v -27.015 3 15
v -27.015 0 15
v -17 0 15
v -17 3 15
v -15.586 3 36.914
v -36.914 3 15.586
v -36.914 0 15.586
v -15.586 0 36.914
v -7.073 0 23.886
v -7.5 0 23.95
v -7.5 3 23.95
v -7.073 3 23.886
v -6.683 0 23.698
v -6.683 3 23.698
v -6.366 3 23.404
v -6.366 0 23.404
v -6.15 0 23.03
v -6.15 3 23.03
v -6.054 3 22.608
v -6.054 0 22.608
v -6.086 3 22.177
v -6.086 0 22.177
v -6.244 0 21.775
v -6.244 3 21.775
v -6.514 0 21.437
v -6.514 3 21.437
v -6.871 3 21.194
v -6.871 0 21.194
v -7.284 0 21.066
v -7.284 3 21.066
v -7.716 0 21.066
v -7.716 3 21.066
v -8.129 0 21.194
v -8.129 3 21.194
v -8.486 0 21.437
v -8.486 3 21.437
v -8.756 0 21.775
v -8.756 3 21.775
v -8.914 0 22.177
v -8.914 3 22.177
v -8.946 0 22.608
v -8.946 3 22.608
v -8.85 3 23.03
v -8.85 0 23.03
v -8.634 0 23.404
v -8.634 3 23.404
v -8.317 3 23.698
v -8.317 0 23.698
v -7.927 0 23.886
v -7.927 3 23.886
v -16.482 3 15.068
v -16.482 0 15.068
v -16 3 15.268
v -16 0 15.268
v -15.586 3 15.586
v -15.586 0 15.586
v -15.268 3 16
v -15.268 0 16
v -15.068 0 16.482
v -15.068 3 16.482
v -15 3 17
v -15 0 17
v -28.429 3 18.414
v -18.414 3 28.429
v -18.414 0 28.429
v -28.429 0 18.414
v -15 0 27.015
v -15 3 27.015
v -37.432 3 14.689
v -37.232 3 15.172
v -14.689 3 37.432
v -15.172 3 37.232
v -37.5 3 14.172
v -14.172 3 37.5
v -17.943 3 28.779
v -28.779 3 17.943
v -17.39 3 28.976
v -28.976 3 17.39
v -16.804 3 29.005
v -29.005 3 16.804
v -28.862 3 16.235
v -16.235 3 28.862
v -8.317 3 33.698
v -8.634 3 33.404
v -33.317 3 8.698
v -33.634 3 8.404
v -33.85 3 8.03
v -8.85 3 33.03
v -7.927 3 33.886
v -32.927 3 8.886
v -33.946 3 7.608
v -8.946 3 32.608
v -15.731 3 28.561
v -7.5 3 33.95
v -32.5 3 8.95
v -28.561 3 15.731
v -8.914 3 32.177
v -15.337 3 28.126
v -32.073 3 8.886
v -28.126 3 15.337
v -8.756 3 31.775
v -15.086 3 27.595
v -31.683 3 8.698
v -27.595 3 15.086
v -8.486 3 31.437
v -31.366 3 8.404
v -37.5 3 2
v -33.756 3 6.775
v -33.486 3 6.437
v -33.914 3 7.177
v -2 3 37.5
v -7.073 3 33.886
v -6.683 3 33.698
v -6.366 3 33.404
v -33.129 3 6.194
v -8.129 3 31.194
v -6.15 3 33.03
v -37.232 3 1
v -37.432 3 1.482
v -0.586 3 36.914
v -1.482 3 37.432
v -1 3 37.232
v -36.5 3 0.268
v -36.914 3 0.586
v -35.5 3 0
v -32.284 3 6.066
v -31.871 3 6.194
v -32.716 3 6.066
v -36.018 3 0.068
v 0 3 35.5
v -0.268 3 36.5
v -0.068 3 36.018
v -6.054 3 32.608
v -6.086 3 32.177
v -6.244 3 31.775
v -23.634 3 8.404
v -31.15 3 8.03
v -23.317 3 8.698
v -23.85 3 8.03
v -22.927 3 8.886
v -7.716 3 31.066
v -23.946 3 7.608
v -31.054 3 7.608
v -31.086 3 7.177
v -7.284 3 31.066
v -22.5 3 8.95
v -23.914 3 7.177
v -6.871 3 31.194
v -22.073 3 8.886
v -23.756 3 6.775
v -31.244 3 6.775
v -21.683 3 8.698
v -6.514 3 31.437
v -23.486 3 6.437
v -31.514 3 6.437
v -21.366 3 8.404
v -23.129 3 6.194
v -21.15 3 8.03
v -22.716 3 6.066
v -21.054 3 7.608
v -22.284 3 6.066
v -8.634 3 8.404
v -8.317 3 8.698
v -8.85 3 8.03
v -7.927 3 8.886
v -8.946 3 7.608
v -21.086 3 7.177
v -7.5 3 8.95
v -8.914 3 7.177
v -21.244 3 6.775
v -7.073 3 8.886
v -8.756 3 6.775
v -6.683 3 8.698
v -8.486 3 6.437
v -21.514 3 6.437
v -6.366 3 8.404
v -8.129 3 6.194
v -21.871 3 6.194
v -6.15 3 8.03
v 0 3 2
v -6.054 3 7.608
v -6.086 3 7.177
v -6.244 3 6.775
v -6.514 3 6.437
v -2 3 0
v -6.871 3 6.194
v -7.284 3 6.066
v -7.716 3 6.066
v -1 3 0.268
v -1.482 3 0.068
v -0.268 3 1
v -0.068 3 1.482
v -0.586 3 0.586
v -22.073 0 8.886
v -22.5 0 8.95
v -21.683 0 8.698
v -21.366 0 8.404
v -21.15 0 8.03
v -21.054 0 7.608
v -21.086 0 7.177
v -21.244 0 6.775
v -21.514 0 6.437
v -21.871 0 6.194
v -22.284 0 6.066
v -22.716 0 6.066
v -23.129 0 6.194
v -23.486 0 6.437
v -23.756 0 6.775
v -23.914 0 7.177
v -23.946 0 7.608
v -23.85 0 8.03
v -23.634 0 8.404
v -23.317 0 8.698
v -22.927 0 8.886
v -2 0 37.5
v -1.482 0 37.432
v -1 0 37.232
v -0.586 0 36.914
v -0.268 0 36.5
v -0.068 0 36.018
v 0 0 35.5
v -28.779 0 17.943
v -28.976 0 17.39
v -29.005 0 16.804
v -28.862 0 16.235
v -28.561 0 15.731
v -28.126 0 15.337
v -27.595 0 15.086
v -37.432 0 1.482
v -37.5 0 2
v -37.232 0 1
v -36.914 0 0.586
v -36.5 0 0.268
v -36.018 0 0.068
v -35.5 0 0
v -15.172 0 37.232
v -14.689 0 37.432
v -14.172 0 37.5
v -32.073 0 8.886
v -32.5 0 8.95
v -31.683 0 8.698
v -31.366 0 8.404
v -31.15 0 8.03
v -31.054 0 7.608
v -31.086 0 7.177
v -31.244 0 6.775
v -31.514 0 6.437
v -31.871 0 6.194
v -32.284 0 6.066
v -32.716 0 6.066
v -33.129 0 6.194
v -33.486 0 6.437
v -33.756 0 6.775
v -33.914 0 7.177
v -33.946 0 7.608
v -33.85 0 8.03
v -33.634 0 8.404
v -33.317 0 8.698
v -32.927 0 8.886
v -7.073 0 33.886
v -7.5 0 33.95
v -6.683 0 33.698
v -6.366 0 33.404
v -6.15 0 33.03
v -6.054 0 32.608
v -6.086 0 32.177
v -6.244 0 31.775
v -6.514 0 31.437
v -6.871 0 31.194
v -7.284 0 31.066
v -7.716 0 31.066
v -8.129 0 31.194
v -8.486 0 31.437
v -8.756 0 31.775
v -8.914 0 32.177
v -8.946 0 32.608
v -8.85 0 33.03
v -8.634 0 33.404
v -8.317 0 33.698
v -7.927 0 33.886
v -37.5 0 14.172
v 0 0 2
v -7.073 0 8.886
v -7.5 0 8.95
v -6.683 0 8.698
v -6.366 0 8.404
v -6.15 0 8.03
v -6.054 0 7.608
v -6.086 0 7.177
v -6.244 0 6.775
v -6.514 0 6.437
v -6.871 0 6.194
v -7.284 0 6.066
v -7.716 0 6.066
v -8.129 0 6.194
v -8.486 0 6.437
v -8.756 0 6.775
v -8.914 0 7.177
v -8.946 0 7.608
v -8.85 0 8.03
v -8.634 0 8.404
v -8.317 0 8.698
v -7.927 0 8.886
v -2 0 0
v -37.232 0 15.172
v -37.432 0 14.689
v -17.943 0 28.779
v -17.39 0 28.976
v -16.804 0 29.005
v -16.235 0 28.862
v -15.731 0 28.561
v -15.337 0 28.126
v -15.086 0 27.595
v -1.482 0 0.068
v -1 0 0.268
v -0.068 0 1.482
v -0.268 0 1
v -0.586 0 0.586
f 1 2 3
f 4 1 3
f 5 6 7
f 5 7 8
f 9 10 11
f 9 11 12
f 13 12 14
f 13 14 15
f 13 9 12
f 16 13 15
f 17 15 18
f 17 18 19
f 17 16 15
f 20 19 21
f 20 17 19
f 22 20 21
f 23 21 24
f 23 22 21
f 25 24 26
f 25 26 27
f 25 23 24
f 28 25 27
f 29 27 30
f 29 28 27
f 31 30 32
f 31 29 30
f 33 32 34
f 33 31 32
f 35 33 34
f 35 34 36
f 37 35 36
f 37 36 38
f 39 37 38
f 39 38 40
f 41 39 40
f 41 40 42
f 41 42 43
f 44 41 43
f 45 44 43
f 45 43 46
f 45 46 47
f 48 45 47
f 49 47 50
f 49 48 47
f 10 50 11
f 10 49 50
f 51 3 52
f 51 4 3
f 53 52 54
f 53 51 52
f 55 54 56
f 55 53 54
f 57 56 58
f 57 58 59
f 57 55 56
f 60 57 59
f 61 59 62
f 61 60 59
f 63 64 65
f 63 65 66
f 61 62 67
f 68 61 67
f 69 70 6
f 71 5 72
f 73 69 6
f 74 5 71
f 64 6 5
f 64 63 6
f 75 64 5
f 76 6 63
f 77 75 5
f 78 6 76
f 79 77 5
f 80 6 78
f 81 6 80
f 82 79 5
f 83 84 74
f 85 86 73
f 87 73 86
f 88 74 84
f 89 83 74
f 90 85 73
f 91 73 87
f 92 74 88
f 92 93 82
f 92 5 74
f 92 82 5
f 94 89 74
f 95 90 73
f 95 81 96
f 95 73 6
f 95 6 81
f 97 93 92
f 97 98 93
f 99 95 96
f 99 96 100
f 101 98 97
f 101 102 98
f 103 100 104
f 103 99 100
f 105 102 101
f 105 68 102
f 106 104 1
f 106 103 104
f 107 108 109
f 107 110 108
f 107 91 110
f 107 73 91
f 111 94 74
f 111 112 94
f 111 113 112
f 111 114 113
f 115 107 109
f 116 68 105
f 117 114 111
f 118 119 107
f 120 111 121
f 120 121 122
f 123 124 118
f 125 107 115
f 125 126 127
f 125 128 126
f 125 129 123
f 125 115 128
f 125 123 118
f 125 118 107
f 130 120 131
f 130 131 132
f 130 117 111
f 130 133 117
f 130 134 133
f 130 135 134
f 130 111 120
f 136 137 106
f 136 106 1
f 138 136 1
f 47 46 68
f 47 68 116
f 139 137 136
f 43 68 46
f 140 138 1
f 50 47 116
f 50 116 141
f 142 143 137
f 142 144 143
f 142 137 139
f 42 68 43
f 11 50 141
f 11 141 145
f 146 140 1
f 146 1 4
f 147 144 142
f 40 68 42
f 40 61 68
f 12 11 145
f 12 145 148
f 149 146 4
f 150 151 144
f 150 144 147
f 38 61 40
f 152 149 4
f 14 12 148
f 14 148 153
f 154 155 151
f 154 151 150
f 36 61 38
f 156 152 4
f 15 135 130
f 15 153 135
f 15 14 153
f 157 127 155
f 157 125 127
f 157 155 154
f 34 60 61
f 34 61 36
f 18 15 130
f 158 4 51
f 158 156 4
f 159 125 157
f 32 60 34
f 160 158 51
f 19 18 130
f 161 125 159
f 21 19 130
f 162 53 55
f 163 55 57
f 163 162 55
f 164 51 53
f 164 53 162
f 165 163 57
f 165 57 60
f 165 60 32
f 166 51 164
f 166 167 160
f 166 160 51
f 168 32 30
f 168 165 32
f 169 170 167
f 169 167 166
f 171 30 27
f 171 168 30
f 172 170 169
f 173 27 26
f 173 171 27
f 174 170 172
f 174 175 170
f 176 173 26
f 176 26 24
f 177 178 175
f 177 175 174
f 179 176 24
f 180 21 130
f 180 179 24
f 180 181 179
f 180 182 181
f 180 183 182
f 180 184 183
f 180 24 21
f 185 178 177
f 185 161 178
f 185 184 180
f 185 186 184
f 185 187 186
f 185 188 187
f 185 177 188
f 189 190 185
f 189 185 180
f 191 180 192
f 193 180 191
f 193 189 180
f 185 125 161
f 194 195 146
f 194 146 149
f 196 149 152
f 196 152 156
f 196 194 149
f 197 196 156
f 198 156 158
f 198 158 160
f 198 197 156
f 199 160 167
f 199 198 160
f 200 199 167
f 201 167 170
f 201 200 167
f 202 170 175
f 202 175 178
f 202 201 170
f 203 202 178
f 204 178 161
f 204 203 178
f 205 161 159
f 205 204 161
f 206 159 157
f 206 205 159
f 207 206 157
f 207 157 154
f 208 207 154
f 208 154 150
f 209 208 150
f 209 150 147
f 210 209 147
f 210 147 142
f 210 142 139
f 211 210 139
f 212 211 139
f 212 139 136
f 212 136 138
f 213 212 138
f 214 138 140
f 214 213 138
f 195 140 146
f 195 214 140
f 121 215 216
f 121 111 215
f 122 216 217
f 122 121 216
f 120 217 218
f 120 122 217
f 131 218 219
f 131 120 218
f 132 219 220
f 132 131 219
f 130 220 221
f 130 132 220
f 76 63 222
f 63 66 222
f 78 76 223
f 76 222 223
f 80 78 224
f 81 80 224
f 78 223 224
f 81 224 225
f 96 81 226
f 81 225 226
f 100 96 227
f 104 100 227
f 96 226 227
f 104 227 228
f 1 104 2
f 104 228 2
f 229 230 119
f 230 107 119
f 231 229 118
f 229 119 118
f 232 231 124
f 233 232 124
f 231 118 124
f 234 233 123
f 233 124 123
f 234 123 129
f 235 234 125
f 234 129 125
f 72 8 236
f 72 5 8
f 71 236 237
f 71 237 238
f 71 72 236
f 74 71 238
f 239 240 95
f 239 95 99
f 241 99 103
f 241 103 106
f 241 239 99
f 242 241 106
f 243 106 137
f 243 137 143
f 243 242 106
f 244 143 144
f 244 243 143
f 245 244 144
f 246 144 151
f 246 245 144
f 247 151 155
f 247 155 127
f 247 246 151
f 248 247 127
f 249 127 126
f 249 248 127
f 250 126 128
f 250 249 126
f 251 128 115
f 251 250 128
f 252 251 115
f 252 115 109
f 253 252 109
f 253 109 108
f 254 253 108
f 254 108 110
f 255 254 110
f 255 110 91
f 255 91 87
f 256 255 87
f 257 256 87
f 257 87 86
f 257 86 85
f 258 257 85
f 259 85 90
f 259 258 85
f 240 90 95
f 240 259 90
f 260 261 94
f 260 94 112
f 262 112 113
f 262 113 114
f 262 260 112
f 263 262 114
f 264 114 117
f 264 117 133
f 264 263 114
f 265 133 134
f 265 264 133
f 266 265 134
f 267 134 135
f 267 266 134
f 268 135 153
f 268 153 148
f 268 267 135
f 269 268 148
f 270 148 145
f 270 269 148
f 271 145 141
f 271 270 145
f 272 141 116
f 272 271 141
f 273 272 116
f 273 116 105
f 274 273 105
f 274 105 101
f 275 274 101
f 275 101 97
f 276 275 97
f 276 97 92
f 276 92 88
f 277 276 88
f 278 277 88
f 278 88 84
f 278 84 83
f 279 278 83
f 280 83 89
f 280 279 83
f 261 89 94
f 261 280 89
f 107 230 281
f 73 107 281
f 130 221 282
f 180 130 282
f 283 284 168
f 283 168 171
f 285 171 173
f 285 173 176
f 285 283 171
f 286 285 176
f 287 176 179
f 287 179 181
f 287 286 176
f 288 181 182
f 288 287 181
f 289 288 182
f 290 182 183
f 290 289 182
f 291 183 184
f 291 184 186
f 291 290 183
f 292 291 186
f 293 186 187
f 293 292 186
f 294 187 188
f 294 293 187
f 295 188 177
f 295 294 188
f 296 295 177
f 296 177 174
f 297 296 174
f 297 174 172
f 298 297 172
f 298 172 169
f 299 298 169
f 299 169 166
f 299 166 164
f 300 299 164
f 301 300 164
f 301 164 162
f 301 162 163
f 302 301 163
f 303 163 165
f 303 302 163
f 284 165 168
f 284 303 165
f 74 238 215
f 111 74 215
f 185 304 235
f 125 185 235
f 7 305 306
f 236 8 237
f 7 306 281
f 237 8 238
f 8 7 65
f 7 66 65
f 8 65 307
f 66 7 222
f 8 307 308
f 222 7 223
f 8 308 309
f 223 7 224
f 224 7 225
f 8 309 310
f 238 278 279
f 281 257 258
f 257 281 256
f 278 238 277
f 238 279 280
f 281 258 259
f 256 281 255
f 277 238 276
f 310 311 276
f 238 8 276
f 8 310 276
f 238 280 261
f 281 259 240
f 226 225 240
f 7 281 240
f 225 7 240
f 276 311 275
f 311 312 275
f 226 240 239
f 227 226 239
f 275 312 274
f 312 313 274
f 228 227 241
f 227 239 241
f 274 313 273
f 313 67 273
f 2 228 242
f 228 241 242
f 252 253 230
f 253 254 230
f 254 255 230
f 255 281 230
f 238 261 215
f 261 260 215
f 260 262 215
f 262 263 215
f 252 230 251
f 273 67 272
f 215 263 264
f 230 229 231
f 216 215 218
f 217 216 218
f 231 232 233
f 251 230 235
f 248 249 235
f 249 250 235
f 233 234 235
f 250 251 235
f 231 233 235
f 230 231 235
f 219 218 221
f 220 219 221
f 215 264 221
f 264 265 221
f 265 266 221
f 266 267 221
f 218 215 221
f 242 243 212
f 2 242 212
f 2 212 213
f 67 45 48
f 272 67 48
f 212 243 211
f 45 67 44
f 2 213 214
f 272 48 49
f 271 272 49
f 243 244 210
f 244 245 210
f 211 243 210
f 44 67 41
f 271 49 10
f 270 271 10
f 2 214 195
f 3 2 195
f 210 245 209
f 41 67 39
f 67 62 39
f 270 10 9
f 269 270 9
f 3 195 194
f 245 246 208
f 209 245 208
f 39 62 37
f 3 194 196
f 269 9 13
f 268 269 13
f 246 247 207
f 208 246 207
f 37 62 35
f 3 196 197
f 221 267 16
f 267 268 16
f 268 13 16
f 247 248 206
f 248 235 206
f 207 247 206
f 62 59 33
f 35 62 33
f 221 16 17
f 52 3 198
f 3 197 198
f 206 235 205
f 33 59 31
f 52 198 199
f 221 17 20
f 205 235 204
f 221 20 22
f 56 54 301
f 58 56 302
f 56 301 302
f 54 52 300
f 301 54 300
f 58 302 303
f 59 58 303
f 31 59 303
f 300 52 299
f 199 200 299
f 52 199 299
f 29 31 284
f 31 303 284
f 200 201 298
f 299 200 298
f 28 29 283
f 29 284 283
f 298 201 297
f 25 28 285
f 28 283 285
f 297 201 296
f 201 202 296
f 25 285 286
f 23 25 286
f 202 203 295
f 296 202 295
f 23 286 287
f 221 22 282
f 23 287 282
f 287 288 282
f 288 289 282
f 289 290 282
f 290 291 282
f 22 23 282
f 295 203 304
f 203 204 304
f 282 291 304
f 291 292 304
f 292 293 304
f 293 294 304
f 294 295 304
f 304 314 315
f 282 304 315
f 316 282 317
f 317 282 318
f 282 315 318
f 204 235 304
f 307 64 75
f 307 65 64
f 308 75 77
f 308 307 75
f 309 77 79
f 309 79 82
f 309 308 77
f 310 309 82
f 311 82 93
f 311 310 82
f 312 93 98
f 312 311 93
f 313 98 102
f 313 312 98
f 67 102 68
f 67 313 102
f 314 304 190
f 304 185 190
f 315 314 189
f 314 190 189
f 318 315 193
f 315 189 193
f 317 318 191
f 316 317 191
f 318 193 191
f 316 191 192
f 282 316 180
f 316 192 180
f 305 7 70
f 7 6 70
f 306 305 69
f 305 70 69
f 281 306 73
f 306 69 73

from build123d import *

# Parameters (mm, degrees)
SKETCH_1_R      = 1.45
EXTRUDE_1_DEPTH = 3
EXTRUDE_2_DEPTH = 3
FILLET_1_R      = 2


with BuildPart() as part:
    # 草图1 → 凸台-拉伸1 (new body)
    with BuildSketch(Plane(origin=(0, 0, 0), x_dir=(1, 0, 0), z_dir=(0, 1, 0))):
        Polygon((0, 0), (-37.5, 0), (-37.5, -15), (-15, -15), (-15, -37.5), (0, -37.5), align=None)
        with Locations(Location((-7.5, -7.5, 0), (0, 0, 270))):
            Circle(SKETCH_1_R, mode=Mode.SUBTRACT)
        with Locations(Location((-22.5, -7.5, 0), (0, 0, 270))):
            Circle(SKETCH_1_R, mode=Mode.SUBTRACT)
        with Locations(Location((-32.5, -7.5, 0), (0, 0, 270))):
            Circle(SKETCH_1_R, mode=Mode.SUBTRACT)
        with Locations(Location((-7.5, -22.5, 0), (0, 0, 270))):
            Circle(SKETCH_1_R, mode=Mode.SUBTRACT)
        with Locations(Location((-7.5, -32.5, 0), (0, 0, 270))):
            Circle(SKETCH_1_R, mode=Mode.SUBTRACT)
    extrude(amount=EXTRUDE_1_DEPTH)

    # 草图2 → 凸台-拉伸2 (add)
    with BuildSketch(Plane(origin=(0, 3, 0), x_dir=(1, 0, 0), z_dir=(0, 1, 0))):
        Polygon((-37.5, -15), (-15, -37.5), (-15, -31.843145751), (-31.843145751, -15), align=None)
    extrude(amount=-EXTRUDE_2_DEPTH)

    # 圆角1
    fillet_1_edges = [part.edges().sort_by_distance(p)[0] for p in [
        (0, 1.5, 37.5),
        (-15, 1.5, 37.5),
        (-15, 1.5, 15),
        (-37.5, 1.5, 15),
        (-37.5, 1.5, 0),
        (0, 1.5, 0),
        (-31.843145751, 1.5, 15),
        (-15, 1.5, 31.843145751),
    ]]
    fillet(fillet_1_edges, radius=FILLET_1_R)


solid = part.part
